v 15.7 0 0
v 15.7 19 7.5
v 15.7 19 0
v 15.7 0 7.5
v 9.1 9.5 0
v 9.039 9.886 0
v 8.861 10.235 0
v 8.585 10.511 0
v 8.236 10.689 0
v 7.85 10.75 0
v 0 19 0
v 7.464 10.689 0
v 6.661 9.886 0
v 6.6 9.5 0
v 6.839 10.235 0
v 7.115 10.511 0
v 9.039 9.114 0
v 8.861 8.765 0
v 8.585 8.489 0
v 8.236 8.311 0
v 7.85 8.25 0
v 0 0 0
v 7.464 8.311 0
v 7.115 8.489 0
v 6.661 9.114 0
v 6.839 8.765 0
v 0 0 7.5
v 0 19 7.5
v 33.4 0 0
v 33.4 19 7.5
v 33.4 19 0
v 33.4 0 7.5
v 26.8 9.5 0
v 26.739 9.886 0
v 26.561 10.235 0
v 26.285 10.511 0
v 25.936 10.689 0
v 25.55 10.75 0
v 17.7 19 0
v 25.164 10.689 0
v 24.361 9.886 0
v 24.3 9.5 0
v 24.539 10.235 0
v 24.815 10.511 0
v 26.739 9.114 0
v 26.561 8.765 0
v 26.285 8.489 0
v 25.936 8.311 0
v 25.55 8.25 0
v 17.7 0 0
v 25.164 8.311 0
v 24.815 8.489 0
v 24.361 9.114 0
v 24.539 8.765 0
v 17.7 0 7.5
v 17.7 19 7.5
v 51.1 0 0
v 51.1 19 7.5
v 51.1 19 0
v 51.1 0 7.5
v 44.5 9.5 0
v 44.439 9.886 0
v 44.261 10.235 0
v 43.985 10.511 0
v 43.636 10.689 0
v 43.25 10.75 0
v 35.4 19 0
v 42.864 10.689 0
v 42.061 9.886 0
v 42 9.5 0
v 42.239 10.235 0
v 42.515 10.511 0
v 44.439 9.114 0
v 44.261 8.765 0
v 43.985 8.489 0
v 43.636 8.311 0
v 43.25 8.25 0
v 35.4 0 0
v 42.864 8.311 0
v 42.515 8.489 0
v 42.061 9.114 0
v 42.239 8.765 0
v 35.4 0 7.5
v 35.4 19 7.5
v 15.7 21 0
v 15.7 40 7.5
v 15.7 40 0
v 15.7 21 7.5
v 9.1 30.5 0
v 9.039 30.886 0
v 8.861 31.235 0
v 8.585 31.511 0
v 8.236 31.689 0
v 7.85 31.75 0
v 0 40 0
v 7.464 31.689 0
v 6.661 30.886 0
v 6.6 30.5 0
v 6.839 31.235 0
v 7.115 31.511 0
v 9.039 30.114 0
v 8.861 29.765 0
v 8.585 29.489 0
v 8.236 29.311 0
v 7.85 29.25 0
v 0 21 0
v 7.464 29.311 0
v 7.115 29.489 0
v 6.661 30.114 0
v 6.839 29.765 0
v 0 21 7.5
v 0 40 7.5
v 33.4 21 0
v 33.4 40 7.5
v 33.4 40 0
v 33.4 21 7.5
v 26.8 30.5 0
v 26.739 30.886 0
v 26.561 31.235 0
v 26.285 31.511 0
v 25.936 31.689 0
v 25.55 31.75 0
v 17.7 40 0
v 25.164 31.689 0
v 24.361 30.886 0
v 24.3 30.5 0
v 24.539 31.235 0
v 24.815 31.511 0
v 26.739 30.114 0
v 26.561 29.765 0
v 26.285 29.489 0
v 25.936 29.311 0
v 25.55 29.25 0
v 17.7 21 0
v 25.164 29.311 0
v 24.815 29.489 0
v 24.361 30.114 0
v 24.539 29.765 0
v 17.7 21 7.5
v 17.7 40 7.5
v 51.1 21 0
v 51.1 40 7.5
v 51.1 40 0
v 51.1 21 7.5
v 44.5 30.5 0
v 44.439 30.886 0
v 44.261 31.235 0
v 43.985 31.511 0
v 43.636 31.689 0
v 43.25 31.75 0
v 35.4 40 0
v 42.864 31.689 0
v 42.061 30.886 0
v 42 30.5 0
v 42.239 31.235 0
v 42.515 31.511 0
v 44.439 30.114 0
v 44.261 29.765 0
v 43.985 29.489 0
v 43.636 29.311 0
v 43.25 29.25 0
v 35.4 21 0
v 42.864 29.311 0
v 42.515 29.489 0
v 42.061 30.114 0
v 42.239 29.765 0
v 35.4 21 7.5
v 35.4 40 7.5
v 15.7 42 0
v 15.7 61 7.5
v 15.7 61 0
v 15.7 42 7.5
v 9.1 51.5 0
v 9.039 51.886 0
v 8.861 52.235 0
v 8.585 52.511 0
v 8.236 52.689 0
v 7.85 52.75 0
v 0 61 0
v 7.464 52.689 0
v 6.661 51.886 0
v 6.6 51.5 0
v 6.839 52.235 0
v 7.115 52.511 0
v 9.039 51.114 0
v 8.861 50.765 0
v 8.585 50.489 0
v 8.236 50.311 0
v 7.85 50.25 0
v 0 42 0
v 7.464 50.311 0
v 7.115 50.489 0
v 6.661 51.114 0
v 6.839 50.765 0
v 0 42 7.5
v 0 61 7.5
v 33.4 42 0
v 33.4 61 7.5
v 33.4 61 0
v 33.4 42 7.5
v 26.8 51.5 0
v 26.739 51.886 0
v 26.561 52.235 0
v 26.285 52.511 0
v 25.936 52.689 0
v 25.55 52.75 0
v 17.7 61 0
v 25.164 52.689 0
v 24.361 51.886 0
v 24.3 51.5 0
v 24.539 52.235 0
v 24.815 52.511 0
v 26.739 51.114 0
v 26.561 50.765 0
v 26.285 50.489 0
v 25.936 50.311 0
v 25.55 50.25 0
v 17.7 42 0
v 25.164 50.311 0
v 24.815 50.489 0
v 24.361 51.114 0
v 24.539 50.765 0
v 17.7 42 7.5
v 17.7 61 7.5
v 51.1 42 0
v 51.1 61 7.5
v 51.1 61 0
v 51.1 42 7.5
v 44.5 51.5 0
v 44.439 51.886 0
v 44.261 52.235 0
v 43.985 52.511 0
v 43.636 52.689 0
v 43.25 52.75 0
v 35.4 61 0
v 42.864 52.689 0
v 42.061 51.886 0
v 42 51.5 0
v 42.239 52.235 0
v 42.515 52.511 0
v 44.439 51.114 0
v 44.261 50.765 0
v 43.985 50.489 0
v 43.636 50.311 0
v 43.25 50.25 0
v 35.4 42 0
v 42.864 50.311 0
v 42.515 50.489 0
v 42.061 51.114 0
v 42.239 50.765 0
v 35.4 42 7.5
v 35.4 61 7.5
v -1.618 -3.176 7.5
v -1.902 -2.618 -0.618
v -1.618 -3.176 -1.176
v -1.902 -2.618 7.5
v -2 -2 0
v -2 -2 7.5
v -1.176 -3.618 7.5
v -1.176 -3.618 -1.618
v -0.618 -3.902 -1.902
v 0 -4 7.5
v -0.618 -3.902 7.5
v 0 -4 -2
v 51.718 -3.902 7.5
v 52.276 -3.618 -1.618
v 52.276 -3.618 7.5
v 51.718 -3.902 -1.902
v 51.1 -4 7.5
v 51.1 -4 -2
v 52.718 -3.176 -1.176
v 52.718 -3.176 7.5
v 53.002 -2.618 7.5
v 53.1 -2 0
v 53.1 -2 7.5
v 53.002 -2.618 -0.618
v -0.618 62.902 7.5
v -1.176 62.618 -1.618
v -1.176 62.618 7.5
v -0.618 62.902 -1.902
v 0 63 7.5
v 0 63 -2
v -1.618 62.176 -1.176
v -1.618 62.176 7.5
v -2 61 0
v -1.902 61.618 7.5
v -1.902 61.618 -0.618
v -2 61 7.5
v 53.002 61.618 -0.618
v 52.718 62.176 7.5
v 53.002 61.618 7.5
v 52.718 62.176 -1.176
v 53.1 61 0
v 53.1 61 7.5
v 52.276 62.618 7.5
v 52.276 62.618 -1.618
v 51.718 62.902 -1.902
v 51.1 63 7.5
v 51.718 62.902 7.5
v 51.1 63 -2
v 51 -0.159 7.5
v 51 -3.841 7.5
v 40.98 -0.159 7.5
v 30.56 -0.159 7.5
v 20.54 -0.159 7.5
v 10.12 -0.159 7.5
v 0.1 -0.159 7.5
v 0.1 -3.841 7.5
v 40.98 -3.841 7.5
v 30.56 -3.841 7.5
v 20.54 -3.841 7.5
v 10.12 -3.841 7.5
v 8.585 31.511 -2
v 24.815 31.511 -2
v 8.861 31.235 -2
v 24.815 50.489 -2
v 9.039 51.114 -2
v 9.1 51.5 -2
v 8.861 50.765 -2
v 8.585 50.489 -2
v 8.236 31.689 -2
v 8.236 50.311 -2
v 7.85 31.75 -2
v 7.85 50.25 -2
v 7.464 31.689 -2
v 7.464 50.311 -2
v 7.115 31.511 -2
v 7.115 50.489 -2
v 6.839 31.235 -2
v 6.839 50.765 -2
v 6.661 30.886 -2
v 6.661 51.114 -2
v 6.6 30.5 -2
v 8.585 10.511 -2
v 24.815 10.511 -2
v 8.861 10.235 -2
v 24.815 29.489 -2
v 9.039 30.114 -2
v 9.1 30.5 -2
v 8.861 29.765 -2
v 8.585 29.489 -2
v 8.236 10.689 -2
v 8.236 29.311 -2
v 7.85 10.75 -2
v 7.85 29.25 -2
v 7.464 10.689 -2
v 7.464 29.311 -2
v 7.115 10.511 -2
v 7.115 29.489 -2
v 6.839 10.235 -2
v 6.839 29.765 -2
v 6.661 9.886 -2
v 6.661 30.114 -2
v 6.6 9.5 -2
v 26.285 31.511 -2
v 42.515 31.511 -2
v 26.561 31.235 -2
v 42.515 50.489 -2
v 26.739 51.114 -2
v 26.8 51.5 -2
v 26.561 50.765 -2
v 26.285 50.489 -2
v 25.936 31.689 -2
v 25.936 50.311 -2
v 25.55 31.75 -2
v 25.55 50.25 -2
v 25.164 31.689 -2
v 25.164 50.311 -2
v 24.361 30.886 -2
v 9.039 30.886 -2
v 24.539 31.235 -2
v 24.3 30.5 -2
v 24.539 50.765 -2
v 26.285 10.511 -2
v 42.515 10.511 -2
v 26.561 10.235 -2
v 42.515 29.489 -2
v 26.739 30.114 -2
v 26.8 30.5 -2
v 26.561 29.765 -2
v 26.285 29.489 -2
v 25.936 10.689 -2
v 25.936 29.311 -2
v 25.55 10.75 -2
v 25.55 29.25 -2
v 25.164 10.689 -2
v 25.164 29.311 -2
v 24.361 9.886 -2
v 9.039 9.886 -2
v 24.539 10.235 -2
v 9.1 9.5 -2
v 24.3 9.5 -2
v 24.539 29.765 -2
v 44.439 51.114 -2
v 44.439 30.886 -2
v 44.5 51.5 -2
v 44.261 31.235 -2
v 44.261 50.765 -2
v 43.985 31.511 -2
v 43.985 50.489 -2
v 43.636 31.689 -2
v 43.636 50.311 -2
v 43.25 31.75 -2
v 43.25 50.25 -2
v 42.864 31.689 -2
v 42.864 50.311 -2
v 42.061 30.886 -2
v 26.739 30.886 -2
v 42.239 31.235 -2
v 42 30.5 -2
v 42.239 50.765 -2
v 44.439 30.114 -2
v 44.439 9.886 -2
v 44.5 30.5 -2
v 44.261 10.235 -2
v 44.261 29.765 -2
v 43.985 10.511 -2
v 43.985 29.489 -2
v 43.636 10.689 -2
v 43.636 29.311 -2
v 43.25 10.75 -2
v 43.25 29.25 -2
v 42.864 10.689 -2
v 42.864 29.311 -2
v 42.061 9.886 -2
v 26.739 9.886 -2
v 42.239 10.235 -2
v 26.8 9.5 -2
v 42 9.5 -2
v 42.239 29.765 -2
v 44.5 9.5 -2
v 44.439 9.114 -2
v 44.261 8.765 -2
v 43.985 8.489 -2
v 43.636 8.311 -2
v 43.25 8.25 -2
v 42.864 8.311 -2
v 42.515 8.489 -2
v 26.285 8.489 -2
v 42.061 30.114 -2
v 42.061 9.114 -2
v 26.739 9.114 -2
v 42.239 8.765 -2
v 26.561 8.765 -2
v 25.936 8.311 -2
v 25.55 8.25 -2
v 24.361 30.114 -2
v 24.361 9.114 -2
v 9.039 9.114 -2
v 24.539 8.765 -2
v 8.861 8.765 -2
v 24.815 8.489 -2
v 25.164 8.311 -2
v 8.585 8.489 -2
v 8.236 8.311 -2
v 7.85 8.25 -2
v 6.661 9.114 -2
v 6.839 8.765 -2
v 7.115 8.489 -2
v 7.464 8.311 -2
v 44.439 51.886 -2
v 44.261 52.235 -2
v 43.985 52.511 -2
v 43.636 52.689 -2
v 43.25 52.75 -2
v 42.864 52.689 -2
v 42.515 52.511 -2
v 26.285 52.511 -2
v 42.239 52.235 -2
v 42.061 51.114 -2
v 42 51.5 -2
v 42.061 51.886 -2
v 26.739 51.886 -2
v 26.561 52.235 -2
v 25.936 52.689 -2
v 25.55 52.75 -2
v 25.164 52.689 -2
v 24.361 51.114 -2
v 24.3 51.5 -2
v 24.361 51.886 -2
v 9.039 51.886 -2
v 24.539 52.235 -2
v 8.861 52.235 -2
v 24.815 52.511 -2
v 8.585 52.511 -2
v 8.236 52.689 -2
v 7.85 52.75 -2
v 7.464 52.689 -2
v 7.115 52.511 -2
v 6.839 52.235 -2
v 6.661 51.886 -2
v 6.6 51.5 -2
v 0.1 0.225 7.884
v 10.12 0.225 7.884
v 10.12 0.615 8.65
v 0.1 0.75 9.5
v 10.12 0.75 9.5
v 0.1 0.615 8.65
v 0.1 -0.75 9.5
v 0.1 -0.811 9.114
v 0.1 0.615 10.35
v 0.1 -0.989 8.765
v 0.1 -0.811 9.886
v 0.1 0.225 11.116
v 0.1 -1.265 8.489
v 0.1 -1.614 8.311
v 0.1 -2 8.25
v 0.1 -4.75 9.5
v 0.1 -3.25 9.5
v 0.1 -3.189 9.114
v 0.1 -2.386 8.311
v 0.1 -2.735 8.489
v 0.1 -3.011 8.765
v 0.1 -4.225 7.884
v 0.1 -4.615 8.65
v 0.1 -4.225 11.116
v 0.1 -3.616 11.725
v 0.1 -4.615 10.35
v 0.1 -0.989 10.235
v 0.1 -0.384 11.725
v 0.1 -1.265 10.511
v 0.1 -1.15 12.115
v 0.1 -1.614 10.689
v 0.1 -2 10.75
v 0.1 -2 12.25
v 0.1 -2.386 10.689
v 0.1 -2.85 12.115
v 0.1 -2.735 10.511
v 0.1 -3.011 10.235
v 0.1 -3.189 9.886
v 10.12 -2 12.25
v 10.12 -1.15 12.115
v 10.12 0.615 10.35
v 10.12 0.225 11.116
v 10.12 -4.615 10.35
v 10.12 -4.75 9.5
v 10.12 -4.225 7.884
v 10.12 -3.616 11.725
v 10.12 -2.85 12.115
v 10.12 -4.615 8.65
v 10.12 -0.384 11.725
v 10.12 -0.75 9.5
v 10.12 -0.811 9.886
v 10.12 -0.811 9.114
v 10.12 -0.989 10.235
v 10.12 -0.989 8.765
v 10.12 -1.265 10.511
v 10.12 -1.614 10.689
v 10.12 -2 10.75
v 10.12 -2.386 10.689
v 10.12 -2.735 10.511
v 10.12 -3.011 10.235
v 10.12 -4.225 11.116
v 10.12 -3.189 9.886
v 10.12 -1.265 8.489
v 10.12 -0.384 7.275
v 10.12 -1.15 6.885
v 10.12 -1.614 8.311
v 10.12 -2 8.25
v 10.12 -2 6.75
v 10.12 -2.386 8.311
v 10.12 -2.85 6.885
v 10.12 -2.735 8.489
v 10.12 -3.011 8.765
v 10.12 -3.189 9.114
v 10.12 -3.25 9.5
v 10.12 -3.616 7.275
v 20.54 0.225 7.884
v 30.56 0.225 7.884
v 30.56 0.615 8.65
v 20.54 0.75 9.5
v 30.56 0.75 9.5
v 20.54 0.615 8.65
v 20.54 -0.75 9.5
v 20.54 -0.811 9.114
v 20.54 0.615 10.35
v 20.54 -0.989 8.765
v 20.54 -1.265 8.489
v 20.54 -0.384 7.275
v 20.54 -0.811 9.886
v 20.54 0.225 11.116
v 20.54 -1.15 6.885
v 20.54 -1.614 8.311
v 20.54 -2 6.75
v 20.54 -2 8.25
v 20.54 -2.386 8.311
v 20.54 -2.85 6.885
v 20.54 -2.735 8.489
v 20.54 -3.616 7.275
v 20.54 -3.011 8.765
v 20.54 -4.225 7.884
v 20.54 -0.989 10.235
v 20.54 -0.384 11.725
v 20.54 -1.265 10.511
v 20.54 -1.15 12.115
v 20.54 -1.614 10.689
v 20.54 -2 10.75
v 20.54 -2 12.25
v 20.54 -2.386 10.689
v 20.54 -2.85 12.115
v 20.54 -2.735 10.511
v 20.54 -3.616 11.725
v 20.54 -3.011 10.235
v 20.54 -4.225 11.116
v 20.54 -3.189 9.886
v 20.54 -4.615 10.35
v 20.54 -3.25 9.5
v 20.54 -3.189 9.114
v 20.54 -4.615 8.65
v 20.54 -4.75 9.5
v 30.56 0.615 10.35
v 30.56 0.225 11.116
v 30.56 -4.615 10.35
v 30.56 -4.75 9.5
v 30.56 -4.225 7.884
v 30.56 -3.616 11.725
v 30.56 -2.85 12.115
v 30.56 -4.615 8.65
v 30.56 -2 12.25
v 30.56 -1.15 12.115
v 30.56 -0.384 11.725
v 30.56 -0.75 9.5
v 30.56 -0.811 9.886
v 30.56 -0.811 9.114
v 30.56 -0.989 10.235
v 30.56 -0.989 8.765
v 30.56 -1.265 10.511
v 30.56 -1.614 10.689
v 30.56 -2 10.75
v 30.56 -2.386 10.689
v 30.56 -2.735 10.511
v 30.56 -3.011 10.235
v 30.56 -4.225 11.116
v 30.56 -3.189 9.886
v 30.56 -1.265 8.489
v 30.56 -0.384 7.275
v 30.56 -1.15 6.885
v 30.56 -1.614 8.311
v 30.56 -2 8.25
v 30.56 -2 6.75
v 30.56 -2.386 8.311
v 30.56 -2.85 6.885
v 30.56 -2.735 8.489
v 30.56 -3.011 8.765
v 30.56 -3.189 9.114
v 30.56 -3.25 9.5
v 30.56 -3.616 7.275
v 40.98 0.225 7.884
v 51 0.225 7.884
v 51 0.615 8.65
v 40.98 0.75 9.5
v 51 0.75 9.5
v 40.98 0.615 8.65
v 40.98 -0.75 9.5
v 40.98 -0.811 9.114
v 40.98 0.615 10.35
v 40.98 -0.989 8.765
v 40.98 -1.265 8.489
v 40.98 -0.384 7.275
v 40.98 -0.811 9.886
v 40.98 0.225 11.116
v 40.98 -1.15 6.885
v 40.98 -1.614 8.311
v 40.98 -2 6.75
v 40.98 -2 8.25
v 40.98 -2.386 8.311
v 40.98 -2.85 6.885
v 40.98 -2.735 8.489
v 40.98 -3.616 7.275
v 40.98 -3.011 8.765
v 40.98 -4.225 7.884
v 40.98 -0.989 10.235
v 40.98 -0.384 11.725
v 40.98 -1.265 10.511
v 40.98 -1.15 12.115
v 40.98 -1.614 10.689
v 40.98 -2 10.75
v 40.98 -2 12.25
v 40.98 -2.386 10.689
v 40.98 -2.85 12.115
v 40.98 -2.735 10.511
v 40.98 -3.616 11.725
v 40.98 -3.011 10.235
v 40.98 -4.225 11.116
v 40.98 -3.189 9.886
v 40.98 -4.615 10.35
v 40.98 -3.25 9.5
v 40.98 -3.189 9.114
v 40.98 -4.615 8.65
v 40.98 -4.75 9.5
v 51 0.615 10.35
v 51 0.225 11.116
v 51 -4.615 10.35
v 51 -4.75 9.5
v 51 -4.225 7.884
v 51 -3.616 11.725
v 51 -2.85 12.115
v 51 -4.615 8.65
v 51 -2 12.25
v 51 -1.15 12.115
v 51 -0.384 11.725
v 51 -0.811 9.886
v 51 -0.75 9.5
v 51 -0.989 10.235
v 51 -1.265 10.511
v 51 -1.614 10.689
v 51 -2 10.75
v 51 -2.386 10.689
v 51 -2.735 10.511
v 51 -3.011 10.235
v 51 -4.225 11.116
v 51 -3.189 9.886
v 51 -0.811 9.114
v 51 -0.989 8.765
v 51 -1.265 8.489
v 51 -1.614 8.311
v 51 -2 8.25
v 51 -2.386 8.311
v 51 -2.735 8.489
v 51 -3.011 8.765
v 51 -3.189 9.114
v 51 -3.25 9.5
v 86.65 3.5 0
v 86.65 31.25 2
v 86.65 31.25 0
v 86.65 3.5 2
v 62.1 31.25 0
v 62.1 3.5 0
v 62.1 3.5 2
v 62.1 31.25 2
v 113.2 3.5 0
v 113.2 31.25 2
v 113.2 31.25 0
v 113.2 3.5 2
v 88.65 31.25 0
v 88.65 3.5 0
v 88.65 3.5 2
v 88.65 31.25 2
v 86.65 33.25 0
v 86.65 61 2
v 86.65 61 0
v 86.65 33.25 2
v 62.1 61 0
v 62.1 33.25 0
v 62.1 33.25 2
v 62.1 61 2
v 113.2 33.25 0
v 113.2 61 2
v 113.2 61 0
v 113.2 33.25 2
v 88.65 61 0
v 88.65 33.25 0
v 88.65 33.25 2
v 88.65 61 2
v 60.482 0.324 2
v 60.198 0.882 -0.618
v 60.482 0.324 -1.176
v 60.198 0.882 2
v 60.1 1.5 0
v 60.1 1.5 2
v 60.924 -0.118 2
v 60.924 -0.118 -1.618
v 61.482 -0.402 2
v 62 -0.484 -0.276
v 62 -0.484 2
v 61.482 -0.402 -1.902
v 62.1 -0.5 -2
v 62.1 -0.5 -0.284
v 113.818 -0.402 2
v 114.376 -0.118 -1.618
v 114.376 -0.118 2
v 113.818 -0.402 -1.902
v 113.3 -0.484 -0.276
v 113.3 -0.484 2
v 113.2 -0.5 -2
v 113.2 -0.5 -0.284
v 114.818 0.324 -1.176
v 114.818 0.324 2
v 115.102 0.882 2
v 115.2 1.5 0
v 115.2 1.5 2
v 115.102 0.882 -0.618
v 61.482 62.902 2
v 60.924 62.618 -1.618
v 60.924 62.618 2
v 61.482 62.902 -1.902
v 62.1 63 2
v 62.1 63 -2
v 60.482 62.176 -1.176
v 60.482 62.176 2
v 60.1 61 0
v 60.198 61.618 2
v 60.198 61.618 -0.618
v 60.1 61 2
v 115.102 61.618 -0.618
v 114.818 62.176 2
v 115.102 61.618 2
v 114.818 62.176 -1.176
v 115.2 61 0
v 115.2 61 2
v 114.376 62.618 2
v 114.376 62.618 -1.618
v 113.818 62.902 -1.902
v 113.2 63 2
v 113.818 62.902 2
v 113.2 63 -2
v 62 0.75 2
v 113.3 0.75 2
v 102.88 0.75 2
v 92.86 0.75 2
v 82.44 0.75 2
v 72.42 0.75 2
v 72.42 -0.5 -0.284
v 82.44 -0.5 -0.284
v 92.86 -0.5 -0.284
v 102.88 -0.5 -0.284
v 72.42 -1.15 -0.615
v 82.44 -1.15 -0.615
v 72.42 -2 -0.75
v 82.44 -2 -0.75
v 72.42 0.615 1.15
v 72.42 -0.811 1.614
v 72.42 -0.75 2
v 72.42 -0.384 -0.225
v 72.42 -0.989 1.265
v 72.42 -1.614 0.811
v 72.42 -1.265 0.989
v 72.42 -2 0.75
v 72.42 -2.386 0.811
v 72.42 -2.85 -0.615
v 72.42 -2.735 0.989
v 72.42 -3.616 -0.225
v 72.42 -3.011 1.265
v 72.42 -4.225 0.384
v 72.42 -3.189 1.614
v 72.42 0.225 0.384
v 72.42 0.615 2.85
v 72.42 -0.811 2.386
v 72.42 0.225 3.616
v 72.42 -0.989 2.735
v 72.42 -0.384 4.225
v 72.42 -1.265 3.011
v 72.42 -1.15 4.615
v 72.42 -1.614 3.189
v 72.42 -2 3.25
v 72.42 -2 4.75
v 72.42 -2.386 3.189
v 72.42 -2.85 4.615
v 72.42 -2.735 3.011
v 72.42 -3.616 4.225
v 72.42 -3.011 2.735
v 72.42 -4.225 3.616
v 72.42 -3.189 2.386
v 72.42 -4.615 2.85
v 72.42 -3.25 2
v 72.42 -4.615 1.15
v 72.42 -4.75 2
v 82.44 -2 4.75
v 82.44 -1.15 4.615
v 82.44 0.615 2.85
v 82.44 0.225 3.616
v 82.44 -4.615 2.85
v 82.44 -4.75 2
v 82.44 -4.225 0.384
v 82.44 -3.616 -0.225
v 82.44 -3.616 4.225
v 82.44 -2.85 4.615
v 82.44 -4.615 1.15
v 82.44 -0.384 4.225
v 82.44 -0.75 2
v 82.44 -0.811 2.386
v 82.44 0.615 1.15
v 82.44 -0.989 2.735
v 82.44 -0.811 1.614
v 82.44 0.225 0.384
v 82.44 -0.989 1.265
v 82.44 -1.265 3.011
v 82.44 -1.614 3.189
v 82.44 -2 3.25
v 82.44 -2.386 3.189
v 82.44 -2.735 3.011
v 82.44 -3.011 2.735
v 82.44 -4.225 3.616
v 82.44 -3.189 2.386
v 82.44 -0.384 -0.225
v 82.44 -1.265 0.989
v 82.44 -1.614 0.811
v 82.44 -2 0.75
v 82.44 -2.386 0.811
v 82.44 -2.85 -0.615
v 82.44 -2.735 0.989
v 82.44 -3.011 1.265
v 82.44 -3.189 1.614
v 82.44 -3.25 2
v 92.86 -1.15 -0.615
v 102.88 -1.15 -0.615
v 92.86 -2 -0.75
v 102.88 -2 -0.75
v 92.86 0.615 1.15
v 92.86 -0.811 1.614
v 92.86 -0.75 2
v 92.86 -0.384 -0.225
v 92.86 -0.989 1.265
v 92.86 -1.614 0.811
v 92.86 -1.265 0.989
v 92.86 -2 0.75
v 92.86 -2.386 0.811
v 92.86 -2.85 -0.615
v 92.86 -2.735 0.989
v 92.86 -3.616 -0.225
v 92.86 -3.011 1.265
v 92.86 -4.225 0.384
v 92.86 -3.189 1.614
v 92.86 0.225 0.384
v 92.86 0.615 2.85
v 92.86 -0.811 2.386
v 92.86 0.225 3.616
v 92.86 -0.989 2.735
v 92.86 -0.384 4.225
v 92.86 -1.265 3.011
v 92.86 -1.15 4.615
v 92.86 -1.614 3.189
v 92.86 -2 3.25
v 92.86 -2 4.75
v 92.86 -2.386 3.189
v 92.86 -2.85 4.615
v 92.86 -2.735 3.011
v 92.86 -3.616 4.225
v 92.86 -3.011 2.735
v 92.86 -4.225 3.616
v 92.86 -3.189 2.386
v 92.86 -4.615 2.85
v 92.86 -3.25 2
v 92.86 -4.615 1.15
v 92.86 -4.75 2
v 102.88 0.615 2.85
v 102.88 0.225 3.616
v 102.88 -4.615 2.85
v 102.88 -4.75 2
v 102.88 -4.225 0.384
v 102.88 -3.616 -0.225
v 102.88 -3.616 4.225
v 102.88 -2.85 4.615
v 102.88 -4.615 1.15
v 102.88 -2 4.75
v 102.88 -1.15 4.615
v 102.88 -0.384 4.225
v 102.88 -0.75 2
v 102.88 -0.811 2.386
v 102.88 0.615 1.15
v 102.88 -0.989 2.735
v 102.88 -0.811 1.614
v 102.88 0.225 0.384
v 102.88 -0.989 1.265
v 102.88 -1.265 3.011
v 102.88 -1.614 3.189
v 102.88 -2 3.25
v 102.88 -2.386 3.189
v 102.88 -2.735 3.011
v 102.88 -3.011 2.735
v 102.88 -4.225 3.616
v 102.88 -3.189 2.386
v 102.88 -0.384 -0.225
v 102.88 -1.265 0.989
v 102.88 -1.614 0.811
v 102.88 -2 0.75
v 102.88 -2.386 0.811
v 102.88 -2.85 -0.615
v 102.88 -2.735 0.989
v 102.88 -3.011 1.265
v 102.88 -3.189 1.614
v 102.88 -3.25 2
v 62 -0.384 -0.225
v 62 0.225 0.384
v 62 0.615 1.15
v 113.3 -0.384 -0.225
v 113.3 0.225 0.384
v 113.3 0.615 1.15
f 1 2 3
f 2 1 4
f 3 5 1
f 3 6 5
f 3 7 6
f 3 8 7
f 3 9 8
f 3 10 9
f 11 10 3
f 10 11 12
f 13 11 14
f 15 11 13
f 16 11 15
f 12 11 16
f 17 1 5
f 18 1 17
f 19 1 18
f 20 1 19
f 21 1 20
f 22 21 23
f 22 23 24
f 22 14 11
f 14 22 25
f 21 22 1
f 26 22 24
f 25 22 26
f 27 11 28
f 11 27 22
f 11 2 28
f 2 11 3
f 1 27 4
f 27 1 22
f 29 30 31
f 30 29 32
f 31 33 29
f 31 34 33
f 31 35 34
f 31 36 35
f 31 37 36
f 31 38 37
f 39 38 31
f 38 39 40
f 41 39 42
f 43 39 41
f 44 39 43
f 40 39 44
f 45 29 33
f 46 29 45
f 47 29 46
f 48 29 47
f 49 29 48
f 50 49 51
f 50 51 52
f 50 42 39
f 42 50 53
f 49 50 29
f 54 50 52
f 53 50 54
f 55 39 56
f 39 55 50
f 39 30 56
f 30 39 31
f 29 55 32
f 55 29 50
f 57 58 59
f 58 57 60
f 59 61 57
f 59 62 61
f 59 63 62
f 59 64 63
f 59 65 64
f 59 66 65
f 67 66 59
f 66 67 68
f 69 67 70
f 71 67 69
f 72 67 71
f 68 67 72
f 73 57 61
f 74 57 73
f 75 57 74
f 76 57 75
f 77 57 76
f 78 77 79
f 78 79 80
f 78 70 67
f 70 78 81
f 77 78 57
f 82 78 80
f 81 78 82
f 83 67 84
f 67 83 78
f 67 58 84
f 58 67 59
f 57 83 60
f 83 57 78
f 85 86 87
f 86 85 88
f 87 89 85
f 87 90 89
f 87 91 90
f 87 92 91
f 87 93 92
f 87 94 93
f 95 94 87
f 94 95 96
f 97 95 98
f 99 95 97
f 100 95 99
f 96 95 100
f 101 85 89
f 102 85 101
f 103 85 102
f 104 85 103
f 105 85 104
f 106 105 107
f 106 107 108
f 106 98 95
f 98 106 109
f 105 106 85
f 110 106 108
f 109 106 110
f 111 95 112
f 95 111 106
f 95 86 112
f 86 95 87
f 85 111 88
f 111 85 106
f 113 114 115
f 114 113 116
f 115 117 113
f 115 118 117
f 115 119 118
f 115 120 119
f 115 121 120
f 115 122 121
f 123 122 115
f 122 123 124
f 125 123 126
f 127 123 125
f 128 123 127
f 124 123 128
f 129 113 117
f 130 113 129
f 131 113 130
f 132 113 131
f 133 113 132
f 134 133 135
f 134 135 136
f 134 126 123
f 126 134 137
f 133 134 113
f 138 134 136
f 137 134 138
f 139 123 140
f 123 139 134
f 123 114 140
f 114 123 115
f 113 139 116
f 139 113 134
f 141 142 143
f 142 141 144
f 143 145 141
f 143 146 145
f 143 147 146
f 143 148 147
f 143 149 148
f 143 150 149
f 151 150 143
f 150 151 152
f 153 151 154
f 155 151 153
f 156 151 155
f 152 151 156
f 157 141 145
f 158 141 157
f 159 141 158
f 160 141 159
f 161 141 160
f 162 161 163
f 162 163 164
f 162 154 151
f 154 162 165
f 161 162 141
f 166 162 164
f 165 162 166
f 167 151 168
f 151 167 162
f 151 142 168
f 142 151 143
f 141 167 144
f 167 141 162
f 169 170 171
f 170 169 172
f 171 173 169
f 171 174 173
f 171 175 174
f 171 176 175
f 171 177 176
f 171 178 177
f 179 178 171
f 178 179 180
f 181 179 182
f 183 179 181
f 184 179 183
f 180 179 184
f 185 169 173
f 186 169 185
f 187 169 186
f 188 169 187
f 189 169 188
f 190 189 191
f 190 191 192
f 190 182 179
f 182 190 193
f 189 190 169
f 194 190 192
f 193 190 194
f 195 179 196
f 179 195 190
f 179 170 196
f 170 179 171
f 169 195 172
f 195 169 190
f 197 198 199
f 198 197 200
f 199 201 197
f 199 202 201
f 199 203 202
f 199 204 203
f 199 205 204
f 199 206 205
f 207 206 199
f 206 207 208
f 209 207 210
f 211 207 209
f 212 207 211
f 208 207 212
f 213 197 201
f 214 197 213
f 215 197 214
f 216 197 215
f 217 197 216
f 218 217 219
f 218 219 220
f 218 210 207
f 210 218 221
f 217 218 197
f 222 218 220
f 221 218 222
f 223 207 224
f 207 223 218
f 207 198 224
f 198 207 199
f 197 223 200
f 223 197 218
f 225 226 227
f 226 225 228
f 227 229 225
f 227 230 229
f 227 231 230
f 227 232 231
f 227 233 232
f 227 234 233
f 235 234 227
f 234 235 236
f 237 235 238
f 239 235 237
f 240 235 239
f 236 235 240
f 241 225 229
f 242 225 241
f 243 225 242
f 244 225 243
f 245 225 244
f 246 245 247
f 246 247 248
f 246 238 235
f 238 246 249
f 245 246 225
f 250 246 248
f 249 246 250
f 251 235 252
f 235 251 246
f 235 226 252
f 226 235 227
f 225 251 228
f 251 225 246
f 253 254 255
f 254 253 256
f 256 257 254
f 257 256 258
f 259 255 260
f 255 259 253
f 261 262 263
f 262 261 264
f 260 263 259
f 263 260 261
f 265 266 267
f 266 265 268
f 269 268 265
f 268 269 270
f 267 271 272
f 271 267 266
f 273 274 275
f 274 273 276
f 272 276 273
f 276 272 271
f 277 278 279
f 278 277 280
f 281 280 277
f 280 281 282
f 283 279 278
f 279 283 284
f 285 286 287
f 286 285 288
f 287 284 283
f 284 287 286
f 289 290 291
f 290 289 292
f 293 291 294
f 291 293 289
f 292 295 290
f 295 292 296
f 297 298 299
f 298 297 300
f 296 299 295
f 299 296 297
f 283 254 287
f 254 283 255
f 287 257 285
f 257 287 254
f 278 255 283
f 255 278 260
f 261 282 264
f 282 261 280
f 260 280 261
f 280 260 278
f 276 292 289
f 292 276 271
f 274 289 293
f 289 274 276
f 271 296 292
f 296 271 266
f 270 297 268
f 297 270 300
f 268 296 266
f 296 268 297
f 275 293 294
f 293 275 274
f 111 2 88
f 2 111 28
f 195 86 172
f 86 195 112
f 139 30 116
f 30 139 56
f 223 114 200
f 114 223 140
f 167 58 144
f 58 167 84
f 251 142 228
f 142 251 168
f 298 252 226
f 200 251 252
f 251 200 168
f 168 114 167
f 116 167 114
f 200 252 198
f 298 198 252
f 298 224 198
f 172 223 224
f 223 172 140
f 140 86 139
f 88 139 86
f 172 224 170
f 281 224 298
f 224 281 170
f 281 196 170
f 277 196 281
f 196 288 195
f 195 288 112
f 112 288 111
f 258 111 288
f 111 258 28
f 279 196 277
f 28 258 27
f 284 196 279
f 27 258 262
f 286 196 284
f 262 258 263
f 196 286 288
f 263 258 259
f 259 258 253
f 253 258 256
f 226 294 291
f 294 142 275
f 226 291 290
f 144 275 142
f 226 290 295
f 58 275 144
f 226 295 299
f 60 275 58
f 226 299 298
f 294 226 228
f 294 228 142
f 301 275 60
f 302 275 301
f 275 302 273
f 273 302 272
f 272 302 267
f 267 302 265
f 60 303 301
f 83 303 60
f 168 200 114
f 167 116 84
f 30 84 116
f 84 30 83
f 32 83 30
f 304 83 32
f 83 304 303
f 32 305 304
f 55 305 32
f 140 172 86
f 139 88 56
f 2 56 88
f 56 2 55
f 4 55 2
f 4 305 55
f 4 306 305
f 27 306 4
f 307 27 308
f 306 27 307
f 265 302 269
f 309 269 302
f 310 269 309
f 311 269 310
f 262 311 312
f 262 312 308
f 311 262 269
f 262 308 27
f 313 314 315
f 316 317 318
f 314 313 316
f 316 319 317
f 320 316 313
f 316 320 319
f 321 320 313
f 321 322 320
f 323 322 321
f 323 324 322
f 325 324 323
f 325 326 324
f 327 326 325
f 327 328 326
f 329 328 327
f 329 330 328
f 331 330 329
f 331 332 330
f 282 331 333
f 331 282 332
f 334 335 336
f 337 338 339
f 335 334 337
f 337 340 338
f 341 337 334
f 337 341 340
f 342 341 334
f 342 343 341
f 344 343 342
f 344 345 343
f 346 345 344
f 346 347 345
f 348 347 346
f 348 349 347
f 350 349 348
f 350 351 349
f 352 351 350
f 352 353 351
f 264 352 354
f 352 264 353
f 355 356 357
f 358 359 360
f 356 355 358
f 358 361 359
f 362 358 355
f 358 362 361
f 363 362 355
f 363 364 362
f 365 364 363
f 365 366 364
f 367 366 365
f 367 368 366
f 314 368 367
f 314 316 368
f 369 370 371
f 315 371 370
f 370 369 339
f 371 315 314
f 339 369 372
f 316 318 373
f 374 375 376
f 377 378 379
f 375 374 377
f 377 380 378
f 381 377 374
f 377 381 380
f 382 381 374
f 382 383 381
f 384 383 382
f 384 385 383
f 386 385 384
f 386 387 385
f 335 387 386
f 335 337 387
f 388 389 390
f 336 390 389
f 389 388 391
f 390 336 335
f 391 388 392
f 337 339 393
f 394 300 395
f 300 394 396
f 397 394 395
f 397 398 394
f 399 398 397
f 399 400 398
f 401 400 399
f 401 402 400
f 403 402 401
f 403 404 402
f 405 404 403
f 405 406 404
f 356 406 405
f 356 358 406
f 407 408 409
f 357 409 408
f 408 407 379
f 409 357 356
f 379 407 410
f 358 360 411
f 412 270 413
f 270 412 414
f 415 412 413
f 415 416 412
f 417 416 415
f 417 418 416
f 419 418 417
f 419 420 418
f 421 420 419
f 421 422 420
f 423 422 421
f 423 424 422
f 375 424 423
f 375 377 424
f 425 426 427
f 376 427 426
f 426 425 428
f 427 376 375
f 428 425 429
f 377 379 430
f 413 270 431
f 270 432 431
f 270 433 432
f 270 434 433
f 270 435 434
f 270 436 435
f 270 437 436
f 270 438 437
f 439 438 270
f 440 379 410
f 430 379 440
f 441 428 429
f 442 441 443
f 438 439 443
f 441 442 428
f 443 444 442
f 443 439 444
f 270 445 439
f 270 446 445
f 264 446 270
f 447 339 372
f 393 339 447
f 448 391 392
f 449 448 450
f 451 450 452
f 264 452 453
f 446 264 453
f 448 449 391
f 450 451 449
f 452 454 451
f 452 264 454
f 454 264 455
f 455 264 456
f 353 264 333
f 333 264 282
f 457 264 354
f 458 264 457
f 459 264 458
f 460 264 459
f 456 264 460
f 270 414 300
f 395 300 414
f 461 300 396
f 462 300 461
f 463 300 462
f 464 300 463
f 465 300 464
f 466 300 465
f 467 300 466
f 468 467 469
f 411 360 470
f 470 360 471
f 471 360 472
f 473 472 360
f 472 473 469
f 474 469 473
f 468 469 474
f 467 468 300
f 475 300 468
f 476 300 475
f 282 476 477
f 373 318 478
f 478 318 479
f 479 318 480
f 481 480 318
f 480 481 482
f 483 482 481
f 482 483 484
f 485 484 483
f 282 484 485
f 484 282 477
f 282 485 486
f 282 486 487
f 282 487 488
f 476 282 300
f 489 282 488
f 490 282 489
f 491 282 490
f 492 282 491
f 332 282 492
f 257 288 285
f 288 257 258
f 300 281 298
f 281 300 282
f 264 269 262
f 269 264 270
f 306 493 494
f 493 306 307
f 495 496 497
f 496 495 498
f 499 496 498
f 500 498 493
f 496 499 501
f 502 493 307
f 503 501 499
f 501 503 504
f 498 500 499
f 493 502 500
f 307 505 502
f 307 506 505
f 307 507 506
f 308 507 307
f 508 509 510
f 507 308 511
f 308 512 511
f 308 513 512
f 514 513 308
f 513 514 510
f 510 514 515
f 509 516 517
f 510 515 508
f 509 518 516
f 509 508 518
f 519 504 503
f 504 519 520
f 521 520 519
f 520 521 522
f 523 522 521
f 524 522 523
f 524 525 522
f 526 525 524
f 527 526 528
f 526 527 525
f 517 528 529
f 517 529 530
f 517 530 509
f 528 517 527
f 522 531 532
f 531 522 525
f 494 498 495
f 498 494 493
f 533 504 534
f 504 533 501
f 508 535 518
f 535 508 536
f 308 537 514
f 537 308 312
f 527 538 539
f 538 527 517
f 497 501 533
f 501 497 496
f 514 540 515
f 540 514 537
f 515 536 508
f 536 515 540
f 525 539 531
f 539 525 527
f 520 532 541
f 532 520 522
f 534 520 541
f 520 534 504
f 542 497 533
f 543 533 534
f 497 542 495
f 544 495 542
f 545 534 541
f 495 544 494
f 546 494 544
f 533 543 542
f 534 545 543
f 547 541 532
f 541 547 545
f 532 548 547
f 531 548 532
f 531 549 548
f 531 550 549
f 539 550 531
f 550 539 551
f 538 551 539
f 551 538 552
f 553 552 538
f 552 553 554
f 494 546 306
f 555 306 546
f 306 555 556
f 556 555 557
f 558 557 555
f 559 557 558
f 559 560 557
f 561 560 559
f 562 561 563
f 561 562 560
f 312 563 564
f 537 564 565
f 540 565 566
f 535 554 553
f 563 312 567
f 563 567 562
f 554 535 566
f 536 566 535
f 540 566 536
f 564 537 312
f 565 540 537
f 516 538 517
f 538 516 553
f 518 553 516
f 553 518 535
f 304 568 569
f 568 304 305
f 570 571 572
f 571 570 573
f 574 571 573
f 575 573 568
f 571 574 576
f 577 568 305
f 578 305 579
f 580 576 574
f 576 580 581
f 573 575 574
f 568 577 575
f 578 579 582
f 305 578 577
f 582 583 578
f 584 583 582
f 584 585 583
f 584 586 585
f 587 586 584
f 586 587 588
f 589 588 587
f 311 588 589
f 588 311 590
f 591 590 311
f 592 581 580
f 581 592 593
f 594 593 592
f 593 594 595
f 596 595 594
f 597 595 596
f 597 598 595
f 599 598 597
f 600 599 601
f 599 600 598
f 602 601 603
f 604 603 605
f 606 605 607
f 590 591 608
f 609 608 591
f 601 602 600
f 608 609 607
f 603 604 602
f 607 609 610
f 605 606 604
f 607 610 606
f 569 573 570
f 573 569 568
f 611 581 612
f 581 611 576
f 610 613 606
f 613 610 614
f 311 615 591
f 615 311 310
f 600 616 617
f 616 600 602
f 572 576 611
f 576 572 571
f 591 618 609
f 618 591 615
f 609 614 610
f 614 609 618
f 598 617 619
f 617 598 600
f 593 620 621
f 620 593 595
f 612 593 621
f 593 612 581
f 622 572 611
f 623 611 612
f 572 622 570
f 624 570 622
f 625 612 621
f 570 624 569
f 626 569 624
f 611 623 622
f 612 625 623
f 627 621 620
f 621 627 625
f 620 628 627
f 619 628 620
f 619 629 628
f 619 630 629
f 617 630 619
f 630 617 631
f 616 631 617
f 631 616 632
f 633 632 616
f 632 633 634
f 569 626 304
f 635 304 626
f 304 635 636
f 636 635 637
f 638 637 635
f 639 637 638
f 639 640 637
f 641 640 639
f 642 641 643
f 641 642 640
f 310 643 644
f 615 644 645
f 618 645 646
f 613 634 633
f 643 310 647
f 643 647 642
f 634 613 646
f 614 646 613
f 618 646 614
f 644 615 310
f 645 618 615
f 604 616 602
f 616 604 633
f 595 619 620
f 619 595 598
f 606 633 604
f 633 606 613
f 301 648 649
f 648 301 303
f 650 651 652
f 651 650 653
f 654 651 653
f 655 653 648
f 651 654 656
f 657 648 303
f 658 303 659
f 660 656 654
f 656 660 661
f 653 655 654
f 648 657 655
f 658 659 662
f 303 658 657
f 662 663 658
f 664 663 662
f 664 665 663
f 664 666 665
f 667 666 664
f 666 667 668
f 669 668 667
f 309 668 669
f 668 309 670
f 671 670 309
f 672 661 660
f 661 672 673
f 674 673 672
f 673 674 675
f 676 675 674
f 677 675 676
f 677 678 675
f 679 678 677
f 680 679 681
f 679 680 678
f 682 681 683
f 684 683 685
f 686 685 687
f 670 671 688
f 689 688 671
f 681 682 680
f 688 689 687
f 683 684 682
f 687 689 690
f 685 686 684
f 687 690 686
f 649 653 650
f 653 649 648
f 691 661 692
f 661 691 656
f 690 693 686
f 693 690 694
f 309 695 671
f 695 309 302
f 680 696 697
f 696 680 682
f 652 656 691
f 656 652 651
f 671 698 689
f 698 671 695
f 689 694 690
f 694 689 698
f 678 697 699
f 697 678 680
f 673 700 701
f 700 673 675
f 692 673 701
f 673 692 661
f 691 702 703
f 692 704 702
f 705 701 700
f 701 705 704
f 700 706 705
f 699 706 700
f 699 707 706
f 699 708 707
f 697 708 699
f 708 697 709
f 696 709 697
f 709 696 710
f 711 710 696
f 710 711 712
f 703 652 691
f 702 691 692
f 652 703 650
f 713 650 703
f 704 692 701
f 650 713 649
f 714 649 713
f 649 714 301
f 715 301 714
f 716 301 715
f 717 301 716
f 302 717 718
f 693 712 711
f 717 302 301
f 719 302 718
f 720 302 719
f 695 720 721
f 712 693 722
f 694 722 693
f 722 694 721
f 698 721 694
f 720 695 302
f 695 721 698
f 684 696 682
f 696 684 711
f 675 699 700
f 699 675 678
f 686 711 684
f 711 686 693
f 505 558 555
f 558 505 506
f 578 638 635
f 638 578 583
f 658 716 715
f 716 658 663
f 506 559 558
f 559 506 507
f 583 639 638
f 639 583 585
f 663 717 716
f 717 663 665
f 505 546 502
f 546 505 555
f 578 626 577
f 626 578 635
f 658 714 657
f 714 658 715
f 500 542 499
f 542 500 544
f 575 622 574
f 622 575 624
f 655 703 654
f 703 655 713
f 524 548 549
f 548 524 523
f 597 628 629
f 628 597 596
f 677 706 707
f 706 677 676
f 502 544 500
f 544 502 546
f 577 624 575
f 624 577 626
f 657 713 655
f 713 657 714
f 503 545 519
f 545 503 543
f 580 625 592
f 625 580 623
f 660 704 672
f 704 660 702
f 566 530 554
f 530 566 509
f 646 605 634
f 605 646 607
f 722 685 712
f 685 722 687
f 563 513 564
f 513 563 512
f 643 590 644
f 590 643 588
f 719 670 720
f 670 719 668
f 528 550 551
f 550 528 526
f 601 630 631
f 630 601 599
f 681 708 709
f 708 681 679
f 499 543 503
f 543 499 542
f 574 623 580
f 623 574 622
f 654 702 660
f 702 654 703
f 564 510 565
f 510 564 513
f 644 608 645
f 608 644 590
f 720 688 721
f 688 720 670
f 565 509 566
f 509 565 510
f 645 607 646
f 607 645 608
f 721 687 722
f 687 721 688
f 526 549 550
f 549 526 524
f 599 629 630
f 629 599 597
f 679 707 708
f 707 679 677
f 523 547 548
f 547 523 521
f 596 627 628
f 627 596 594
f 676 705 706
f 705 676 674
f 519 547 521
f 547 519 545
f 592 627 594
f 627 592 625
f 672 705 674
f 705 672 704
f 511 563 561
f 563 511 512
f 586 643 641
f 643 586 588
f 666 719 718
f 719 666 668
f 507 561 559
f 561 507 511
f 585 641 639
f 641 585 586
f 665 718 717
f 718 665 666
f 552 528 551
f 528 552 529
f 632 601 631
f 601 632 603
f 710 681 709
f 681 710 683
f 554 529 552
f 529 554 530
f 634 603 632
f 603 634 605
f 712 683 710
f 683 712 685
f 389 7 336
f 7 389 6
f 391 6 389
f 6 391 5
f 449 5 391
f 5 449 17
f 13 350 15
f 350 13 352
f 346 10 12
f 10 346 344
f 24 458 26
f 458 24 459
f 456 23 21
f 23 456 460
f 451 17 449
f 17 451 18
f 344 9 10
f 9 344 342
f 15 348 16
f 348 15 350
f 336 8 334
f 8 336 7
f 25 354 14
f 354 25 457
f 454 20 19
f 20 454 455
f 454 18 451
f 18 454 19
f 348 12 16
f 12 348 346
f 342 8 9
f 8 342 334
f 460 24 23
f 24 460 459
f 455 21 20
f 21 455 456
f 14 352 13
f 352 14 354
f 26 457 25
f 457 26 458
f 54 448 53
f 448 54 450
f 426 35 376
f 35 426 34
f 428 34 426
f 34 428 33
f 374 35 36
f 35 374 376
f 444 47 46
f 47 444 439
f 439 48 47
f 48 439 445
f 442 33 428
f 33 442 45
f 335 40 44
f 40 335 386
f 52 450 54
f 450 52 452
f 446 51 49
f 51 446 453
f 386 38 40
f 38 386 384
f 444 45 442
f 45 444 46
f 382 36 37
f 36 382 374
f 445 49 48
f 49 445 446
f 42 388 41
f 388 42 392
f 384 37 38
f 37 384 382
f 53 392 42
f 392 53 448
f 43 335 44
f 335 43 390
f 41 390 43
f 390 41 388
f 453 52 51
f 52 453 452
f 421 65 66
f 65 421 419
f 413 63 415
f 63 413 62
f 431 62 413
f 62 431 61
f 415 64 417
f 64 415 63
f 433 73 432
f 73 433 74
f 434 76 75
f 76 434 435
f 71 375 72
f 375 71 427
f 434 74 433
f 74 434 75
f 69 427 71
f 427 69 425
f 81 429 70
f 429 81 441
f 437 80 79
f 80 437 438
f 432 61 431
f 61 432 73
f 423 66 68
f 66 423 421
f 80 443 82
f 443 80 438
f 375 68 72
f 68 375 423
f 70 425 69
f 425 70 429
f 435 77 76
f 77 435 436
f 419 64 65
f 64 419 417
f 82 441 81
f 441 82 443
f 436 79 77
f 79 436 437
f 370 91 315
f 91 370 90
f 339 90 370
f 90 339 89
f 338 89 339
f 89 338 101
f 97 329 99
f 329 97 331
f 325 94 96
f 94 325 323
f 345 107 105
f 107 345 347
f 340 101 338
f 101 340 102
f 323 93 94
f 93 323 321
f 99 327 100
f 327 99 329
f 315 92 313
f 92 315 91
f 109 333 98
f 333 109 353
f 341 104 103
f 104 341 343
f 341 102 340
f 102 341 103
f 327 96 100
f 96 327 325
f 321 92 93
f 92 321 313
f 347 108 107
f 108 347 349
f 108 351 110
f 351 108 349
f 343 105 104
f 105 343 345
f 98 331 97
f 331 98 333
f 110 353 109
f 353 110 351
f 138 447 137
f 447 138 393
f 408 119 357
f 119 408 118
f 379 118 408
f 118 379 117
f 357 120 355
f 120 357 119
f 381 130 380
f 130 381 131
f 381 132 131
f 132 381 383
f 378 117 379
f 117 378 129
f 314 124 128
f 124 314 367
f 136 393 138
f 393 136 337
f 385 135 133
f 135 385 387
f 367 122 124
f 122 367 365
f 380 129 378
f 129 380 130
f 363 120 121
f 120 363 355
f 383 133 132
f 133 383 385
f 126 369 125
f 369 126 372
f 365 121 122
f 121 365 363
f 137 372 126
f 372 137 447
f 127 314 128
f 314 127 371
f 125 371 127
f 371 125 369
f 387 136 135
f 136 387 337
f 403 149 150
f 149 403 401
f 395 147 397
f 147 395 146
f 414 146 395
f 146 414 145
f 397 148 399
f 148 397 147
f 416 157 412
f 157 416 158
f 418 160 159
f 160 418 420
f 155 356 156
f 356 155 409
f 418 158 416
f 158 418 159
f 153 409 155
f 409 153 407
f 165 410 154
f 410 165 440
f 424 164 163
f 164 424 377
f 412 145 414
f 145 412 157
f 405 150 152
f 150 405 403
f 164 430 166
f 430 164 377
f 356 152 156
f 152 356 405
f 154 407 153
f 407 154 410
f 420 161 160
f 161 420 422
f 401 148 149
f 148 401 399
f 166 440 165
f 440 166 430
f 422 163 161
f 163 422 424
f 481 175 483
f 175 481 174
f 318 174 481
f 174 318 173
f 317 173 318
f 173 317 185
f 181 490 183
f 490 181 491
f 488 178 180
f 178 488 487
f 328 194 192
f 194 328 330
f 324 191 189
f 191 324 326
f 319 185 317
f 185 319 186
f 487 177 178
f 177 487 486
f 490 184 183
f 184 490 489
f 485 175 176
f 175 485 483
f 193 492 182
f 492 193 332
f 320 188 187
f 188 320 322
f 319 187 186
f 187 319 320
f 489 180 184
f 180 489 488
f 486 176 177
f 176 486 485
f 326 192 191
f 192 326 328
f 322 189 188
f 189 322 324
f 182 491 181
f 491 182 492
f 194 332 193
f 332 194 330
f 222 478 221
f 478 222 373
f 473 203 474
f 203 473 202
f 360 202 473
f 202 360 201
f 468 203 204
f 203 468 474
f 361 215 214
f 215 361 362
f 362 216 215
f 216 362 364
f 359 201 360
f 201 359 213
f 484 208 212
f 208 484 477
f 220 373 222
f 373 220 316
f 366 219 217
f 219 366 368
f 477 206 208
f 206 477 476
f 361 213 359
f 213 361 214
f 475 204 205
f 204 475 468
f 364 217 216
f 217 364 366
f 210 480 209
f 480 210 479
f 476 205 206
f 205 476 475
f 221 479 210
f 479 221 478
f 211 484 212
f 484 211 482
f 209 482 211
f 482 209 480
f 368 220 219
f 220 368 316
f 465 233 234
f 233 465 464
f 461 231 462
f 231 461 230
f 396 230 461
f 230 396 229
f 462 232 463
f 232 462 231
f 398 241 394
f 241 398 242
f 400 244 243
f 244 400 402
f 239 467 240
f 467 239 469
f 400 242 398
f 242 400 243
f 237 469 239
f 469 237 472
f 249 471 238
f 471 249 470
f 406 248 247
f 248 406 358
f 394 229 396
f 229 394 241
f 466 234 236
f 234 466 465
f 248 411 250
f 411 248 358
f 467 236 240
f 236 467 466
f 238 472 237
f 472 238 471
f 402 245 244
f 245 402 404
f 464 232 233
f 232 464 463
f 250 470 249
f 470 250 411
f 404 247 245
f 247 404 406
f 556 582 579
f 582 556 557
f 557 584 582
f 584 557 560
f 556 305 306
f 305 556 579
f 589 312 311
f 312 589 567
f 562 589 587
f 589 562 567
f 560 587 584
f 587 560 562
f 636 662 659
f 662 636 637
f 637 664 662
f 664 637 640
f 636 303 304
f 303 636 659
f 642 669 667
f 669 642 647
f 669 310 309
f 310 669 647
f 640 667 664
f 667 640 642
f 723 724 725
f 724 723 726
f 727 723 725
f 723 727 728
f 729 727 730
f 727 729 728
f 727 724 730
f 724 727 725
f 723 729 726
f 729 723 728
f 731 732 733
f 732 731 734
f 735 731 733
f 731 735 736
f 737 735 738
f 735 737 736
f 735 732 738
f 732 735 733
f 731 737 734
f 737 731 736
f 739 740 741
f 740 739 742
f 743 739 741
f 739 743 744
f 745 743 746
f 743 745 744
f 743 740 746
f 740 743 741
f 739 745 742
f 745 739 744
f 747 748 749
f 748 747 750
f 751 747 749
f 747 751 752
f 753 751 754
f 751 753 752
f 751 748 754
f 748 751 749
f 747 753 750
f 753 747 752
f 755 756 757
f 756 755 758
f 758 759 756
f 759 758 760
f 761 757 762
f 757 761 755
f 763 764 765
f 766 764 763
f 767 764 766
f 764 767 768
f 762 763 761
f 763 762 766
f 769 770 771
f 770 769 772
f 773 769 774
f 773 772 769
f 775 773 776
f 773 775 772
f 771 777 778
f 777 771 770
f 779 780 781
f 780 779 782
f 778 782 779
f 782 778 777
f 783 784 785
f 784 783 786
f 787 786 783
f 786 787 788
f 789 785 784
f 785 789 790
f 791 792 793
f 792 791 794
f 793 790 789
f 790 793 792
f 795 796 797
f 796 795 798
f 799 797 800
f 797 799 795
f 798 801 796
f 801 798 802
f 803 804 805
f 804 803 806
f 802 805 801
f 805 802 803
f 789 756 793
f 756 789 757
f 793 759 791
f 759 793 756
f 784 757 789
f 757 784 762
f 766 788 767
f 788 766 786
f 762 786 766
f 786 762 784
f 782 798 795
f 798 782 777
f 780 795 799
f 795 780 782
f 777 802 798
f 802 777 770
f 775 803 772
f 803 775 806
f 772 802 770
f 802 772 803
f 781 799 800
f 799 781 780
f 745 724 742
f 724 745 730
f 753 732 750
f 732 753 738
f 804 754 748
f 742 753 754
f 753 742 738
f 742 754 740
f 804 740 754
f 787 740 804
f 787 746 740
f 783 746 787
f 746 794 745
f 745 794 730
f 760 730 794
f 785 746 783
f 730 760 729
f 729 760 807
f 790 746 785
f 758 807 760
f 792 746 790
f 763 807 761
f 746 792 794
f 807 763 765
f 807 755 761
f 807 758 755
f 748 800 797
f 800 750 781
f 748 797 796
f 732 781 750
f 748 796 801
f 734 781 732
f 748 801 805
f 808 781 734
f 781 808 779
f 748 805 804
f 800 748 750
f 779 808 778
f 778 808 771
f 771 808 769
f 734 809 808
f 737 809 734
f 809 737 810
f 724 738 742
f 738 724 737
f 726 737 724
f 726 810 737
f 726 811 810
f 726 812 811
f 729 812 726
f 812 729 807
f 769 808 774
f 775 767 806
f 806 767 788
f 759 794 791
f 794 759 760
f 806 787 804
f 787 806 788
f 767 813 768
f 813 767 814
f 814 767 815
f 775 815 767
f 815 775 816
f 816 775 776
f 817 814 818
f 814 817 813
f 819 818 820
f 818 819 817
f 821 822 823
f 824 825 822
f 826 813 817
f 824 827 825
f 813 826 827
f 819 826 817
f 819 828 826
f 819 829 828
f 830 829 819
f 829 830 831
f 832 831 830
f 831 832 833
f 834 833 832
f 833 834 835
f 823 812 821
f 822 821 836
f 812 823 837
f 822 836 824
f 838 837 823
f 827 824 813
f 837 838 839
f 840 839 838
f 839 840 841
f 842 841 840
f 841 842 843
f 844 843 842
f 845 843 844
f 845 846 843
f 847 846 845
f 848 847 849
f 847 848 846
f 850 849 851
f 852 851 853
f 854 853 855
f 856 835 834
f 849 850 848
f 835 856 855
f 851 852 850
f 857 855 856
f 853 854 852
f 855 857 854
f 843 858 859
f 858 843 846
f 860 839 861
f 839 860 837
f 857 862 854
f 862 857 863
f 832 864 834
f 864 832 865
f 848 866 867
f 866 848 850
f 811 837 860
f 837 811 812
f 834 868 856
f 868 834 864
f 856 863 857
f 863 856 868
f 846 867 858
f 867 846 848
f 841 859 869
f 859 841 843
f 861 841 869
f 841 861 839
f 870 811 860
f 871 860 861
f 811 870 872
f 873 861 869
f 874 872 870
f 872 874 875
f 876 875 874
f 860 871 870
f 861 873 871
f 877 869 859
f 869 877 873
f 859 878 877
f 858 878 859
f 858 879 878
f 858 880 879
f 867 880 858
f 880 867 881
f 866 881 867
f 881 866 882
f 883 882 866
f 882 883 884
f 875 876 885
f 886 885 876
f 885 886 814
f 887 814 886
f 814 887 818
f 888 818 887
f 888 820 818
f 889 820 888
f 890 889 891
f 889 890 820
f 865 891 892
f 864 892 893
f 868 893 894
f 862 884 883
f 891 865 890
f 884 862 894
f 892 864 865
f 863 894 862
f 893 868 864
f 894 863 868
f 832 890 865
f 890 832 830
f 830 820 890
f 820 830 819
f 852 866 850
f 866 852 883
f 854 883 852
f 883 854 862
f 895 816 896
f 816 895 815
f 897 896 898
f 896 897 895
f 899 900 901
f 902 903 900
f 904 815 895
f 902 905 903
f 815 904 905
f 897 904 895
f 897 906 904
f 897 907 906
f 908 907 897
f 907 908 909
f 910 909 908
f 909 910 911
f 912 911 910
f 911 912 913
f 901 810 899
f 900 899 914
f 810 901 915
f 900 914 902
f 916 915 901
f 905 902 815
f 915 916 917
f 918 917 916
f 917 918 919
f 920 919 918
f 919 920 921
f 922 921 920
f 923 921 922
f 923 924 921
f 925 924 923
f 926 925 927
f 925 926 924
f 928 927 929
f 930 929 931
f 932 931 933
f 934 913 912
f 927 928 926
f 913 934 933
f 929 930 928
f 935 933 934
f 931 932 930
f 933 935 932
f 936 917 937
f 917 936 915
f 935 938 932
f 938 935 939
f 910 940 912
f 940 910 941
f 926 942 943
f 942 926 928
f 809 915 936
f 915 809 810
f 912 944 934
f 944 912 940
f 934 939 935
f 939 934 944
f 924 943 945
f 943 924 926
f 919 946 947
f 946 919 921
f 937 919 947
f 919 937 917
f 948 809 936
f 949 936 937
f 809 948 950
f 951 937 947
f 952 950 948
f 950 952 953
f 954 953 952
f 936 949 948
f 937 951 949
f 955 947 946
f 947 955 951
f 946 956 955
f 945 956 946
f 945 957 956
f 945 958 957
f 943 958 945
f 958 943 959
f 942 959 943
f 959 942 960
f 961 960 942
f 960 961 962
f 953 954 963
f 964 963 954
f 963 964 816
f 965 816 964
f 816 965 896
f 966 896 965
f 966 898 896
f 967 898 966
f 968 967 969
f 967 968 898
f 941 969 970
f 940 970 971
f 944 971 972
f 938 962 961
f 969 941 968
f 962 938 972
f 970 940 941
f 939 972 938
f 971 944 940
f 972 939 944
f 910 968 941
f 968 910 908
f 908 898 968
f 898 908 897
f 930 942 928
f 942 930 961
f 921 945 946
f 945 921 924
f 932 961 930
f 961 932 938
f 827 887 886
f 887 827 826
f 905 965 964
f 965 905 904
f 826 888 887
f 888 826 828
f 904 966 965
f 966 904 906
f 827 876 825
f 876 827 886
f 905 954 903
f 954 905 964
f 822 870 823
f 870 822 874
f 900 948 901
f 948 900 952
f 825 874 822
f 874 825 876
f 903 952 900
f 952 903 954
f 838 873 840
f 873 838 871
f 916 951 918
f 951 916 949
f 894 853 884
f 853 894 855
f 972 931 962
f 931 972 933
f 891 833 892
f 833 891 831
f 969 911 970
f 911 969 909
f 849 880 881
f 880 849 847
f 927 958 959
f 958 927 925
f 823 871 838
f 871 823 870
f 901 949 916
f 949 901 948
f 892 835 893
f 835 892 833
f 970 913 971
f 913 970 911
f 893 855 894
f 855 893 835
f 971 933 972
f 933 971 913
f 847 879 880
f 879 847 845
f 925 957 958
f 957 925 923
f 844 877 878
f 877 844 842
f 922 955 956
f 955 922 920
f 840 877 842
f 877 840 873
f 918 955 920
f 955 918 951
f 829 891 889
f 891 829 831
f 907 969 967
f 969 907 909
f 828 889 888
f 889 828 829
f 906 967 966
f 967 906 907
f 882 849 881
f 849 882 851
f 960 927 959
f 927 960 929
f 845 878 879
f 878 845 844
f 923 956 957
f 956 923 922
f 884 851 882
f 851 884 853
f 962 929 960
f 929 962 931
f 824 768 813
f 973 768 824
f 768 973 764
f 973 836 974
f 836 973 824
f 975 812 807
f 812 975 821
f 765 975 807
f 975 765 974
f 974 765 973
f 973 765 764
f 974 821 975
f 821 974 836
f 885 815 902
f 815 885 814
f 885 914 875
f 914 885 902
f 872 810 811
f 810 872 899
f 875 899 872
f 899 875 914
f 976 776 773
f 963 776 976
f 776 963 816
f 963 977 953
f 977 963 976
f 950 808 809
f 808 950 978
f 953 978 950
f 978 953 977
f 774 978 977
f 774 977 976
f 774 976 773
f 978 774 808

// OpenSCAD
// Parametric Watercolor Palette for standard half-pan watercolors
// Created by Michael S. Scherotter 
// Copyright (c) 2019 Michael S. Scherotter
// Use wire construction flags for hinge pins

// watercolor pan width
panWidth = 15.7; // [15:17]

// watercolor pan height
panHeight = 19;  // [18:20]

// watercolor pan depth
panDepth = 9.5;  // [9:11]

// number of columns
panColumns = 3; // [1:10]

// number of rows
panRows = 3;    // [1:10]

// spacing between pans
spacing = 2;    // [1:5]

// gap between hinge pieces
hingeGap = 0.1;

hingeSegments = 5; // [3:8]
// corner fillet
filletRadius = 2; // [1:3]

// hinge thickness
hingeThickness = 1.5;

// pin diameter
pinDiameter = 2.5; 

module pan(panWidth, panHeight, panDepth){
    scale([panWidth, panHeight, panDepth])
    cube();
}

module pans(panRows, panColumns, panWidth, panHeight, panDepth){
for(r = [0: panRows-1]) 
    for (c=[0: panColumns-1]) 
        translate([c*(panWidth + spacing), r*(panHeight+spacing), 0])
            pan(panWidth, panHeight, panDepth);
}

module tray(panWidth, panHeight, panColumns, panRows, panDepth){
    echo("trays:", panWidth, panHeight, panColumns, panRows, panDepth);
    scaleX = spacing+(panWidth +spacing) * panColumns;
    scaleY = spacing + spacing+(panHeight+spacing) * panRows;
     echo("trayWidth", scaleX);
    echo("trayHeight", scaleY);
    translate([-spacing,-spacing * 2,-spacing])
        scale([scaleX, scaleY, panDepth])
        cube();
}

module fillet(length){
    
    difference()
    {
        scale([filletRadius+0.1, filletRadius+0.1, length])
            cube();
       translate([0,0,-1]) 
       cylinder(length+2, r=filletRadius, $fn=20);
    }
}

module topHinge(start, center, gap)
{
    tx = panColumns * panWidth  +15;
    ty = -spacing - pinDiameter -2;
    tz = 2;
    hinge(tx, ty, tz, start, center, gap);
}

module top(){
    echo("top");
    mixingColumns = ceil(panColumns / 2);
    mixingRows = ceil(panRows / 2);
    
    bottomWidth = spacing+(panWidth +spacing) * panColumns;
    bottomHeight = spacing+(panHeight+spacing) * panRows - (pinDiameter + 1);
    echo("bottomWidth", bottomWidth);
    echo("bottomHeight", bottomHeight);
    mixingWidth = ((bottomWidth  - spacing) / mixingColumns) - spacing;
    mixingHeight = ((bottomHeight- spacing) / mixingRows) - spacing;
    echo("mixingHeight", mixingHeight);
    translate([0,pinDiameter+2,0])
    difference()
    {
        union()
        {
            translate([panColumns * panWidth + 15,-1,0])
                buildCels(mixingWidth, mixingHeight, 4, mixingColumns, mixingRows);
            topHinge(1, true, hingeGap);
        }
        topHinge(0, false, -hingeGap);
    }
}

module bottomHinge(start, gap){
    echo("bottomHinge", start, gap);
    hinge(0,-spacing, panDepth, start, true, gap);
}

module hinge(tx, ty, tz, start, center, gap){
    echo("hinge", tx,ty,tz,start,center,gap);
    hingeSegmentSize = ((panWidth + spacing) * panColumns - spacing) / hingeSegments;
    
    translate([tx,ty,tz])
    rotate(90, [0,1,0])
    union()
    {
        difference()
        {
            union()
            {
                for(i=[start:2:hingeSegments-1])
                    translate([0,0,hingeSegmentSize * i + gap])
                    cylinder(hingeSegmentSize - (gap * 2), d=pinDiameter+hingeThickness*2, $fn=20);
            };
            if (center)
            {
                translate([0,0,-1])
                cylinder((panWidth + spacing+2) * panColumns, d=pinDiameter, $fn=20);
            }
        };
    }
}

module pinHoles()
{
for(r = [0: panRows-1]) 
    for (c=[0: panColumns-1]) 
        translate([c*(panWidth + spacing) + panWidth / 2, r*(panHeight+spacing) + panHeight/2, -3])
            cylinder(4, d=pinDiameter, $fn=20);
}

module bottom(){
    echo("bottom");
    difference()
    {
        union()
        {
            buildCels(panWidth, panHeight, panDepth, panColumns, panRows);
            bottomHinge(0, hingeGap);
        }
        pinHoles();
        bottomHinge(1, -hingeGap);
    }
}

module bottomLongEdge(panWidth, panRows, panColumns)
{
    // bottom long edge  
    rotate(-90, [1,0,0])
    translate([(panWidth + spacing)*panColumns - filletRadius,0,0-(spacing*2)])
    fillet(panWidth * (panRows + spacing) + spacing + spacing + spacing);
}
    
module buildCels(panWidth, panHeight, panDepth, panColumns, panRows)
{
    difference()
    {
        tray(panWidth, panHeight, panColumns, panRows, panDepth);    
        pans(panRows, panColumns, panWidth, panHeight, panDepth);
        rotate(180)
            translate([0,spacing,-3])
                fillet(panDepth+2);
        translate([panColumns * (panWidth + spacing) - spacing,-spacing,-3])
            rotate(-90)
                fillet(panDepth+2);
        translate([0,panRows * (panHeight + spacing) - spacing, -3])
            rotate(90)
                fillet(panDepth + 2);
       translate([panColumns * (panWidth + spacing) - spacing,panRows * (panHeight + spacing) - spacing,-3])
           fillet(panDepth+2);
        rotate(90,[1,0,0])
        rotate(180)
        translate([0,0,-panWidth * (panRows+spacing) - spacing])
        fillet(panWidth * (panRows + spacing) + spacing + spacing + spacing);

         bottomLongEdge(panWidth, panRows, panColumns);   
    }
}

bottom();
top();
